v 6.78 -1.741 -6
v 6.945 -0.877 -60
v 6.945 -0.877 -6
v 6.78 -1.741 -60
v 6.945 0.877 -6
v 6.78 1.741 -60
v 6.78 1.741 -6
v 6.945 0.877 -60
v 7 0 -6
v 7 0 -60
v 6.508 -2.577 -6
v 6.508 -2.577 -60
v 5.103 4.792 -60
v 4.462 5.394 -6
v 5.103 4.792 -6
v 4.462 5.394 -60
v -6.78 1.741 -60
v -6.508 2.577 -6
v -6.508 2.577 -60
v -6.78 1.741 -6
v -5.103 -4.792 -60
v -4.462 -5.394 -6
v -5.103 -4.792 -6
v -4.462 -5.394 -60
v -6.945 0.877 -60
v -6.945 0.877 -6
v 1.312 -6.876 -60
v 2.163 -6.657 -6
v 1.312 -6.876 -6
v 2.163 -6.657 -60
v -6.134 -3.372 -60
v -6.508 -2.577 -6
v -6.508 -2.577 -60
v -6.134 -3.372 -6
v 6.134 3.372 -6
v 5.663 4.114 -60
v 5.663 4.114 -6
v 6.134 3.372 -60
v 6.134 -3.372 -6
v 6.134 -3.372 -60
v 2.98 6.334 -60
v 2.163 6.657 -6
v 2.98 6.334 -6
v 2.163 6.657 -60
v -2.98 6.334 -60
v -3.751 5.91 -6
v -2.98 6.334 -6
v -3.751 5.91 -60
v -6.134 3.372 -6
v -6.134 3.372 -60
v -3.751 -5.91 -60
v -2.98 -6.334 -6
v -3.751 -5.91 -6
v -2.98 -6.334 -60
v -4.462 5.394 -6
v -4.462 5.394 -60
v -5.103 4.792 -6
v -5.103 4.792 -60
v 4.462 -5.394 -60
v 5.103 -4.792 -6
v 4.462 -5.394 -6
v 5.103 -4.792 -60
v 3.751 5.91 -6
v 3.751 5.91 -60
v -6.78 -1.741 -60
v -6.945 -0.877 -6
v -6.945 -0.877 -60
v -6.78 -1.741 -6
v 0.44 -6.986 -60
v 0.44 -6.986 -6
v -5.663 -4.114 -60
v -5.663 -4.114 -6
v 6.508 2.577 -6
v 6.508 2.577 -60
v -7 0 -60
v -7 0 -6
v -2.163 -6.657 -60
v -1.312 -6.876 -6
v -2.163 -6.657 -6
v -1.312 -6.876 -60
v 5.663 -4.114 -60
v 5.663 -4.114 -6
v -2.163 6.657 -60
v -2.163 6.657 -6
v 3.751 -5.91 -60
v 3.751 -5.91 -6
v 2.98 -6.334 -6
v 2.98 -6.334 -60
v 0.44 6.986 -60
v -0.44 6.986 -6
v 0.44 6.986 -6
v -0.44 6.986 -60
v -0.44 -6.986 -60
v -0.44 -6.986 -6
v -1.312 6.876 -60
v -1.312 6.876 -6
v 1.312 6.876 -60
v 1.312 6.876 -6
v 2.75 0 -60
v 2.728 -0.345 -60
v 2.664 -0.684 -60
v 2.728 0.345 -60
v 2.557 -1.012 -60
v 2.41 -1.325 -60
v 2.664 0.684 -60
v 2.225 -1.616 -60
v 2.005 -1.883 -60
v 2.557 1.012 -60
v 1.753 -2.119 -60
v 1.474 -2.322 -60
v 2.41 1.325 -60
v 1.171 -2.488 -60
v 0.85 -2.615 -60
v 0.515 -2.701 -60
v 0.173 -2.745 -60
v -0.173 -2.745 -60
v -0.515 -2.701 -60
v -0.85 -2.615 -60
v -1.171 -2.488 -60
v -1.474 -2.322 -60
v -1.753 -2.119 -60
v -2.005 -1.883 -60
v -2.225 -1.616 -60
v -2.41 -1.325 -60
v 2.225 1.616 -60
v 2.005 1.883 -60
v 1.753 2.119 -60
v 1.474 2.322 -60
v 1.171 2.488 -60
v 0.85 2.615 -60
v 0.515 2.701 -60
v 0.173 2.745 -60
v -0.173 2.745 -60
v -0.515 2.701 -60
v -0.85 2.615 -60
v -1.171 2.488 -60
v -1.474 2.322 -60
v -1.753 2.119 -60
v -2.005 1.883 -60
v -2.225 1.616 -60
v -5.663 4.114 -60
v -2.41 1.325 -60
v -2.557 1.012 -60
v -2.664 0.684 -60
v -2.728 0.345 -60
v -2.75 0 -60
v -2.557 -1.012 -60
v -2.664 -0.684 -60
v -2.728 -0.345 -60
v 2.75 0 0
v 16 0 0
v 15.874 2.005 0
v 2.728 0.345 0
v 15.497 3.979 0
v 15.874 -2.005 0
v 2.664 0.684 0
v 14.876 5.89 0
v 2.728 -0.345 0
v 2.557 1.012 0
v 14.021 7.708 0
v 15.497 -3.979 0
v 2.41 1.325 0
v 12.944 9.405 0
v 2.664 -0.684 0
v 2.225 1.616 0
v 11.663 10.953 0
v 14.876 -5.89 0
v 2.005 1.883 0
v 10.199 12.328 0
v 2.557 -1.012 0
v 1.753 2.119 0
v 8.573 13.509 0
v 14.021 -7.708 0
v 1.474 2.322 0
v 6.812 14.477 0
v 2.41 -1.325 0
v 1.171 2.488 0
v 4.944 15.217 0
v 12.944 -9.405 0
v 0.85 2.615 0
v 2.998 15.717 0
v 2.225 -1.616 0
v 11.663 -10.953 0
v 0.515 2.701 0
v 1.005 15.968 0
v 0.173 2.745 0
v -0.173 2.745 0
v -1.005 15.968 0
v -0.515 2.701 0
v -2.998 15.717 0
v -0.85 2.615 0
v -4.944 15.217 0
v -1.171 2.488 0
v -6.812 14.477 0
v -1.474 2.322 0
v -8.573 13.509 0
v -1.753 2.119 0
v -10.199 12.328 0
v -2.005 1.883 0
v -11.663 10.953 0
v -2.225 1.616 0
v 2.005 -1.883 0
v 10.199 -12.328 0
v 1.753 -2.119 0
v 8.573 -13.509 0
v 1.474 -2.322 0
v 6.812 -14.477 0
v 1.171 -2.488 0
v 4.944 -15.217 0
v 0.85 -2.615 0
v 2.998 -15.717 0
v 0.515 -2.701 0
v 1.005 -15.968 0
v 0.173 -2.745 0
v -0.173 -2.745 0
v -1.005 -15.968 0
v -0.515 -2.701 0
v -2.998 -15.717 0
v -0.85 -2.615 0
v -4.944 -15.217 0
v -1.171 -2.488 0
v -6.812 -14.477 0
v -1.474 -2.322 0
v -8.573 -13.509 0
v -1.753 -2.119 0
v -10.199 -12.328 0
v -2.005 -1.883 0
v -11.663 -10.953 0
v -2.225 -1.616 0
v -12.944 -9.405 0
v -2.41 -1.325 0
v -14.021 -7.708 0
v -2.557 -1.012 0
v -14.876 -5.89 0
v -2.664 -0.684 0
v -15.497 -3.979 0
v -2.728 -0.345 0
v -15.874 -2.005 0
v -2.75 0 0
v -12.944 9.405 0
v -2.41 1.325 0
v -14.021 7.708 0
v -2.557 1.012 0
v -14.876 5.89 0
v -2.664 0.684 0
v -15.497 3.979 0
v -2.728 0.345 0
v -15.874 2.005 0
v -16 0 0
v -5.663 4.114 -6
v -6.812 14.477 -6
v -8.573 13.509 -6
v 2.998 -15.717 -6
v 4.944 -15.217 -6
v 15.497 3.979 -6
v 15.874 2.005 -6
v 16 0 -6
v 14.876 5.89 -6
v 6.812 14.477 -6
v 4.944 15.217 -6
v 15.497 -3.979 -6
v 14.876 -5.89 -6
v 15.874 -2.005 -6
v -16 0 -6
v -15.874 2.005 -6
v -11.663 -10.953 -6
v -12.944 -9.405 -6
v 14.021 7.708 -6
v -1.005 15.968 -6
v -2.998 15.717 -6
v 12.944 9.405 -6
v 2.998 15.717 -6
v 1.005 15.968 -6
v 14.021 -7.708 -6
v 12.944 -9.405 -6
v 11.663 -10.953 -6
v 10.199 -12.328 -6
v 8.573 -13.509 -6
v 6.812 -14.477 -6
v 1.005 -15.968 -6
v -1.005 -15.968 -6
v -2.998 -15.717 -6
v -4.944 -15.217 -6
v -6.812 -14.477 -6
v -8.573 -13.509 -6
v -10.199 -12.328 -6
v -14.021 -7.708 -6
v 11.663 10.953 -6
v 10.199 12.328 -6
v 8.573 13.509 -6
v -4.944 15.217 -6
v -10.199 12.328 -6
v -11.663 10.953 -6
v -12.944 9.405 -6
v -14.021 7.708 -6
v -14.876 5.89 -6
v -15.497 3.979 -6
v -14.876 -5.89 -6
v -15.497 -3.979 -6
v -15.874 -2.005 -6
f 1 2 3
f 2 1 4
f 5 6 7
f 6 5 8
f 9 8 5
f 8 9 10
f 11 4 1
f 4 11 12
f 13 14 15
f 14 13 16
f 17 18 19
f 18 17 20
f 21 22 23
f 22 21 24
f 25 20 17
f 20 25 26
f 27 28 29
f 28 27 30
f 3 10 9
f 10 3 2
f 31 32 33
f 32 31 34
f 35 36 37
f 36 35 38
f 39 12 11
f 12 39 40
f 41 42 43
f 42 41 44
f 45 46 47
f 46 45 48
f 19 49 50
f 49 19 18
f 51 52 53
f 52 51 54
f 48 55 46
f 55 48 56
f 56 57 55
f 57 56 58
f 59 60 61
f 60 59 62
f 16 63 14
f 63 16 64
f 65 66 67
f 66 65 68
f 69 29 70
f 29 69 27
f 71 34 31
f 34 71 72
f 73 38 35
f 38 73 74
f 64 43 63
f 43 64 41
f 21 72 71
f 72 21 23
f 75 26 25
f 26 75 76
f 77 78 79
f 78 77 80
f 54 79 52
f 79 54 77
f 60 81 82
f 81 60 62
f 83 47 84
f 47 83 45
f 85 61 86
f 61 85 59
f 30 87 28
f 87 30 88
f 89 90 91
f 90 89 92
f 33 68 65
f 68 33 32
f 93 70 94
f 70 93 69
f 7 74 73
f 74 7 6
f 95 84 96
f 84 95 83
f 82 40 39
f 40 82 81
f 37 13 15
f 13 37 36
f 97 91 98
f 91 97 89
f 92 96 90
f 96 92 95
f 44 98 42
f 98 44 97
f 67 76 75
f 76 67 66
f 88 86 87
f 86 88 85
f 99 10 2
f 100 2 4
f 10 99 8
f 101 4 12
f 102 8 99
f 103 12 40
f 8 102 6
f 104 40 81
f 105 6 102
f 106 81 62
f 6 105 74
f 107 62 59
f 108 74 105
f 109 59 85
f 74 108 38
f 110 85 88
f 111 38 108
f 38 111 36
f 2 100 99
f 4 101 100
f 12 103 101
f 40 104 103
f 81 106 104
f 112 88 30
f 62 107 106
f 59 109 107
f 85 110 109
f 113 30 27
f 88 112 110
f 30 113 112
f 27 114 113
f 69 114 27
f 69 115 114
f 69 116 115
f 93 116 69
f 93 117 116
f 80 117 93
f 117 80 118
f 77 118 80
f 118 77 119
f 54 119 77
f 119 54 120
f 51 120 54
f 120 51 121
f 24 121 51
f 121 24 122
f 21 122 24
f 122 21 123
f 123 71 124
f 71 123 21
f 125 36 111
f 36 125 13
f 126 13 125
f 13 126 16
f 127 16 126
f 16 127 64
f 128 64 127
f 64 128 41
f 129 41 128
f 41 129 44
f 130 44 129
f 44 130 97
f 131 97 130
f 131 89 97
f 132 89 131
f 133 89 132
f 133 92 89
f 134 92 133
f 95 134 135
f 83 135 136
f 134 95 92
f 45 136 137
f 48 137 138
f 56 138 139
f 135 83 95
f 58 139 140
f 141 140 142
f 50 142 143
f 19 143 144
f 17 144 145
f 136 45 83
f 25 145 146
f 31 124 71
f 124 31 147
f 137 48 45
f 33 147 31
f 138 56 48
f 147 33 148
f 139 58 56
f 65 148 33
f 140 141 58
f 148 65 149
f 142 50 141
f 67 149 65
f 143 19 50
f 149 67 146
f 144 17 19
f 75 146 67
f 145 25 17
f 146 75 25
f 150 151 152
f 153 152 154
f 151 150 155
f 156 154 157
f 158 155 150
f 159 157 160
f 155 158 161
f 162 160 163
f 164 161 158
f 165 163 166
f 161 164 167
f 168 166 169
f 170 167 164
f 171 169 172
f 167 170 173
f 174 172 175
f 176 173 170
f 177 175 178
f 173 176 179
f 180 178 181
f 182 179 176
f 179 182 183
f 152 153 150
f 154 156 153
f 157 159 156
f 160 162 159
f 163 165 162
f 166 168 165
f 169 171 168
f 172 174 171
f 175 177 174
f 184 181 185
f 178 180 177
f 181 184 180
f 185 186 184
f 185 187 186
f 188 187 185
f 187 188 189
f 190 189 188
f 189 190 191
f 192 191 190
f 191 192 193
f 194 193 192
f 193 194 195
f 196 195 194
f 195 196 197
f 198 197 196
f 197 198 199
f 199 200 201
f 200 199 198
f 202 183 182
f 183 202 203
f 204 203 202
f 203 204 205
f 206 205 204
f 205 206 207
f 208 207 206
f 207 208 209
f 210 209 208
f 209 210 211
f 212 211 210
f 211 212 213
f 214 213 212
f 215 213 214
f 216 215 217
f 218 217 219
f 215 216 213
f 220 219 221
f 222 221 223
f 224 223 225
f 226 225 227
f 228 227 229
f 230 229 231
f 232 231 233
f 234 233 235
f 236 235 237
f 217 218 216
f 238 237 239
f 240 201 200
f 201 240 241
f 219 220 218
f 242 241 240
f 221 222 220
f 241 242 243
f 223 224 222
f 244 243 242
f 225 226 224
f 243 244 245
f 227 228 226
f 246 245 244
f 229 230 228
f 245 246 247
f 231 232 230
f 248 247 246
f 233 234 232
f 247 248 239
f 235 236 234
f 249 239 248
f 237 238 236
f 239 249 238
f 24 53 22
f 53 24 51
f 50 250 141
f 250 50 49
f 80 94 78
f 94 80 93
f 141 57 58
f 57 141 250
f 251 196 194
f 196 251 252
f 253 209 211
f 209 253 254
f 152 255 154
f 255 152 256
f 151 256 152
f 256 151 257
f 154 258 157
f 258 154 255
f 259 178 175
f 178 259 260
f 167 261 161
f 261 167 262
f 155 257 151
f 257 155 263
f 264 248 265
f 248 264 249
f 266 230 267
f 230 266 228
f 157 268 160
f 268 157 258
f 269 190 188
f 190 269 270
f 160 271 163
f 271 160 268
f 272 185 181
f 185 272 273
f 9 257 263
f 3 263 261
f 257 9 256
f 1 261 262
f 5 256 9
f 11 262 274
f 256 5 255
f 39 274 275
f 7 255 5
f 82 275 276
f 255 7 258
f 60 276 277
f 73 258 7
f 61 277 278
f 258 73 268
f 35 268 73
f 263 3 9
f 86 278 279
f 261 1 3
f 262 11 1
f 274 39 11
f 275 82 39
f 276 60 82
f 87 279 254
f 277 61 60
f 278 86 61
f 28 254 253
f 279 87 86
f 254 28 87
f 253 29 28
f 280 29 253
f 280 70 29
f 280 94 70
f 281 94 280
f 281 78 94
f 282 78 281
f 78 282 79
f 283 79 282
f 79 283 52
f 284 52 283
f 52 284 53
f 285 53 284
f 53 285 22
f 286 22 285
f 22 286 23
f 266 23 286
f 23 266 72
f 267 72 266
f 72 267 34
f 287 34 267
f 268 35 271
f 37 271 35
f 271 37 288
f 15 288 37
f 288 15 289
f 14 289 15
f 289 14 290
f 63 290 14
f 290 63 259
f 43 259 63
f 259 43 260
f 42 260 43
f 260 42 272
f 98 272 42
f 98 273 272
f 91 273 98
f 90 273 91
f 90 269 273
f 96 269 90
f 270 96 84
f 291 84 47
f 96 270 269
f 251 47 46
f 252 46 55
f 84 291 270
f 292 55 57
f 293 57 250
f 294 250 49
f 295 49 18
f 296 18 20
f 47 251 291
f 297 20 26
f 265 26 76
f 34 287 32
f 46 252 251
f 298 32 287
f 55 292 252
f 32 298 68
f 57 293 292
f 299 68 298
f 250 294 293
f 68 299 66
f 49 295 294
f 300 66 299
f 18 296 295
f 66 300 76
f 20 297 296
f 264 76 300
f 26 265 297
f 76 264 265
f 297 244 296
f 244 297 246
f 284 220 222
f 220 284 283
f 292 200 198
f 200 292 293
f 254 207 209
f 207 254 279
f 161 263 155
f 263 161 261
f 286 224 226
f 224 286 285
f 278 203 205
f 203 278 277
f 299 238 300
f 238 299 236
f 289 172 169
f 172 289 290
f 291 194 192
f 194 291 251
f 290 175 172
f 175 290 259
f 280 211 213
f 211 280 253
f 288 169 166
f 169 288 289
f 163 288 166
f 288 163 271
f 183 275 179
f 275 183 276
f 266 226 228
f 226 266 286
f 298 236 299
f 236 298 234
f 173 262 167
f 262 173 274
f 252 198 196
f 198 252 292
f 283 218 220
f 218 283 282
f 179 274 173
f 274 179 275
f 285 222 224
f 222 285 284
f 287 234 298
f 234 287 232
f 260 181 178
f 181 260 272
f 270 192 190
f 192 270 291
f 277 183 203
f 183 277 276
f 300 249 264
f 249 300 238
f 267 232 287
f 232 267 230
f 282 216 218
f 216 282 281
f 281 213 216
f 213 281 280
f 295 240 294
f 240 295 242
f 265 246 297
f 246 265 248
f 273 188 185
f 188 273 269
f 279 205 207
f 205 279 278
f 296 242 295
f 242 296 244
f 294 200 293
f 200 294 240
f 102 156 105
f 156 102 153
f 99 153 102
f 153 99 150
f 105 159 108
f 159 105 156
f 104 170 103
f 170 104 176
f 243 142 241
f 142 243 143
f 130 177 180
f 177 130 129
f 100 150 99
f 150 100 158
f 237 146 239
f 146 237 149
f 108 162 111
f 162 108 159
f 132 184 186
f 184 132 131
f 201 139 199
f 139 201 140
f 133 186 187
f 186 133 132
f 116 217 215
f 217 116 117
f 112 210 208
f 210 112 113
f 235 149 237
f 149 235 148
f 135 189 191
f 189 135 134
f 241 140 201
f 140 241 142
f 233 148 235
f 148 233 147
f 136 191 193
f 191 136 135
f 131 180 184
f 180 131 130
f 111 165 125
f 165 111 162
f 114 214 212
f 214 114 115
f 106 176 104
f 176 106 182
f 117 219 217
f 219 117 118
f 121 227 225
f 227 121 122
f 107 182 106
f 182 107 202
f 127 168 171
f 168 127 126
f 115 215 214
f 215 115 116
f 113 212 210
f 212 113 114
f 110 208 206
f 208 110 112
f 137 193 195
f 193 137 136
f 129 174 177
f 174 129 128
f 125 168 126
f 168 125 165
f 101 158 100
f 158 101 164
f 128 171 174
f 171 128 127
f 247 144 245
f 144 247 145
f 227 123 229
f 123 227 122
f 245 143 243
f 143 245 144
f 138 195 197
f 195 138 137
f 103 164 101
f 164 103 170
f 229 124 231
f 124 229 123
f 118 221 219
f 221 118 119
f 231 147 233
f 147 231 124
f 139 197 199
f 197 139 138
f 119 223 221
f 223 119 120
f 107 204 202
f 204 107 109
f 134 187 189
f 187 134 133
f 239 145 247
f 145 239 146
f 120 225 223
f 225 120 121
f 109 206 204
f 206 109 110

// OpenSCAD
$fn = 50;


difference() {
	union() {
		translate(v = [0, 0, -60.0000000000]) {
			cylinder(h = 60, r = 7.0000000000);
		}
		translate(v = [0, 0, -6.0000000000]) {
			cylinder(h = 6, r = 16.0000000000);
		}
	}
	union() {
		#translate(v = [0, 0, -60]) {
			cylinder(h = 60, r = 2.7500000000);
		}
	}
}
